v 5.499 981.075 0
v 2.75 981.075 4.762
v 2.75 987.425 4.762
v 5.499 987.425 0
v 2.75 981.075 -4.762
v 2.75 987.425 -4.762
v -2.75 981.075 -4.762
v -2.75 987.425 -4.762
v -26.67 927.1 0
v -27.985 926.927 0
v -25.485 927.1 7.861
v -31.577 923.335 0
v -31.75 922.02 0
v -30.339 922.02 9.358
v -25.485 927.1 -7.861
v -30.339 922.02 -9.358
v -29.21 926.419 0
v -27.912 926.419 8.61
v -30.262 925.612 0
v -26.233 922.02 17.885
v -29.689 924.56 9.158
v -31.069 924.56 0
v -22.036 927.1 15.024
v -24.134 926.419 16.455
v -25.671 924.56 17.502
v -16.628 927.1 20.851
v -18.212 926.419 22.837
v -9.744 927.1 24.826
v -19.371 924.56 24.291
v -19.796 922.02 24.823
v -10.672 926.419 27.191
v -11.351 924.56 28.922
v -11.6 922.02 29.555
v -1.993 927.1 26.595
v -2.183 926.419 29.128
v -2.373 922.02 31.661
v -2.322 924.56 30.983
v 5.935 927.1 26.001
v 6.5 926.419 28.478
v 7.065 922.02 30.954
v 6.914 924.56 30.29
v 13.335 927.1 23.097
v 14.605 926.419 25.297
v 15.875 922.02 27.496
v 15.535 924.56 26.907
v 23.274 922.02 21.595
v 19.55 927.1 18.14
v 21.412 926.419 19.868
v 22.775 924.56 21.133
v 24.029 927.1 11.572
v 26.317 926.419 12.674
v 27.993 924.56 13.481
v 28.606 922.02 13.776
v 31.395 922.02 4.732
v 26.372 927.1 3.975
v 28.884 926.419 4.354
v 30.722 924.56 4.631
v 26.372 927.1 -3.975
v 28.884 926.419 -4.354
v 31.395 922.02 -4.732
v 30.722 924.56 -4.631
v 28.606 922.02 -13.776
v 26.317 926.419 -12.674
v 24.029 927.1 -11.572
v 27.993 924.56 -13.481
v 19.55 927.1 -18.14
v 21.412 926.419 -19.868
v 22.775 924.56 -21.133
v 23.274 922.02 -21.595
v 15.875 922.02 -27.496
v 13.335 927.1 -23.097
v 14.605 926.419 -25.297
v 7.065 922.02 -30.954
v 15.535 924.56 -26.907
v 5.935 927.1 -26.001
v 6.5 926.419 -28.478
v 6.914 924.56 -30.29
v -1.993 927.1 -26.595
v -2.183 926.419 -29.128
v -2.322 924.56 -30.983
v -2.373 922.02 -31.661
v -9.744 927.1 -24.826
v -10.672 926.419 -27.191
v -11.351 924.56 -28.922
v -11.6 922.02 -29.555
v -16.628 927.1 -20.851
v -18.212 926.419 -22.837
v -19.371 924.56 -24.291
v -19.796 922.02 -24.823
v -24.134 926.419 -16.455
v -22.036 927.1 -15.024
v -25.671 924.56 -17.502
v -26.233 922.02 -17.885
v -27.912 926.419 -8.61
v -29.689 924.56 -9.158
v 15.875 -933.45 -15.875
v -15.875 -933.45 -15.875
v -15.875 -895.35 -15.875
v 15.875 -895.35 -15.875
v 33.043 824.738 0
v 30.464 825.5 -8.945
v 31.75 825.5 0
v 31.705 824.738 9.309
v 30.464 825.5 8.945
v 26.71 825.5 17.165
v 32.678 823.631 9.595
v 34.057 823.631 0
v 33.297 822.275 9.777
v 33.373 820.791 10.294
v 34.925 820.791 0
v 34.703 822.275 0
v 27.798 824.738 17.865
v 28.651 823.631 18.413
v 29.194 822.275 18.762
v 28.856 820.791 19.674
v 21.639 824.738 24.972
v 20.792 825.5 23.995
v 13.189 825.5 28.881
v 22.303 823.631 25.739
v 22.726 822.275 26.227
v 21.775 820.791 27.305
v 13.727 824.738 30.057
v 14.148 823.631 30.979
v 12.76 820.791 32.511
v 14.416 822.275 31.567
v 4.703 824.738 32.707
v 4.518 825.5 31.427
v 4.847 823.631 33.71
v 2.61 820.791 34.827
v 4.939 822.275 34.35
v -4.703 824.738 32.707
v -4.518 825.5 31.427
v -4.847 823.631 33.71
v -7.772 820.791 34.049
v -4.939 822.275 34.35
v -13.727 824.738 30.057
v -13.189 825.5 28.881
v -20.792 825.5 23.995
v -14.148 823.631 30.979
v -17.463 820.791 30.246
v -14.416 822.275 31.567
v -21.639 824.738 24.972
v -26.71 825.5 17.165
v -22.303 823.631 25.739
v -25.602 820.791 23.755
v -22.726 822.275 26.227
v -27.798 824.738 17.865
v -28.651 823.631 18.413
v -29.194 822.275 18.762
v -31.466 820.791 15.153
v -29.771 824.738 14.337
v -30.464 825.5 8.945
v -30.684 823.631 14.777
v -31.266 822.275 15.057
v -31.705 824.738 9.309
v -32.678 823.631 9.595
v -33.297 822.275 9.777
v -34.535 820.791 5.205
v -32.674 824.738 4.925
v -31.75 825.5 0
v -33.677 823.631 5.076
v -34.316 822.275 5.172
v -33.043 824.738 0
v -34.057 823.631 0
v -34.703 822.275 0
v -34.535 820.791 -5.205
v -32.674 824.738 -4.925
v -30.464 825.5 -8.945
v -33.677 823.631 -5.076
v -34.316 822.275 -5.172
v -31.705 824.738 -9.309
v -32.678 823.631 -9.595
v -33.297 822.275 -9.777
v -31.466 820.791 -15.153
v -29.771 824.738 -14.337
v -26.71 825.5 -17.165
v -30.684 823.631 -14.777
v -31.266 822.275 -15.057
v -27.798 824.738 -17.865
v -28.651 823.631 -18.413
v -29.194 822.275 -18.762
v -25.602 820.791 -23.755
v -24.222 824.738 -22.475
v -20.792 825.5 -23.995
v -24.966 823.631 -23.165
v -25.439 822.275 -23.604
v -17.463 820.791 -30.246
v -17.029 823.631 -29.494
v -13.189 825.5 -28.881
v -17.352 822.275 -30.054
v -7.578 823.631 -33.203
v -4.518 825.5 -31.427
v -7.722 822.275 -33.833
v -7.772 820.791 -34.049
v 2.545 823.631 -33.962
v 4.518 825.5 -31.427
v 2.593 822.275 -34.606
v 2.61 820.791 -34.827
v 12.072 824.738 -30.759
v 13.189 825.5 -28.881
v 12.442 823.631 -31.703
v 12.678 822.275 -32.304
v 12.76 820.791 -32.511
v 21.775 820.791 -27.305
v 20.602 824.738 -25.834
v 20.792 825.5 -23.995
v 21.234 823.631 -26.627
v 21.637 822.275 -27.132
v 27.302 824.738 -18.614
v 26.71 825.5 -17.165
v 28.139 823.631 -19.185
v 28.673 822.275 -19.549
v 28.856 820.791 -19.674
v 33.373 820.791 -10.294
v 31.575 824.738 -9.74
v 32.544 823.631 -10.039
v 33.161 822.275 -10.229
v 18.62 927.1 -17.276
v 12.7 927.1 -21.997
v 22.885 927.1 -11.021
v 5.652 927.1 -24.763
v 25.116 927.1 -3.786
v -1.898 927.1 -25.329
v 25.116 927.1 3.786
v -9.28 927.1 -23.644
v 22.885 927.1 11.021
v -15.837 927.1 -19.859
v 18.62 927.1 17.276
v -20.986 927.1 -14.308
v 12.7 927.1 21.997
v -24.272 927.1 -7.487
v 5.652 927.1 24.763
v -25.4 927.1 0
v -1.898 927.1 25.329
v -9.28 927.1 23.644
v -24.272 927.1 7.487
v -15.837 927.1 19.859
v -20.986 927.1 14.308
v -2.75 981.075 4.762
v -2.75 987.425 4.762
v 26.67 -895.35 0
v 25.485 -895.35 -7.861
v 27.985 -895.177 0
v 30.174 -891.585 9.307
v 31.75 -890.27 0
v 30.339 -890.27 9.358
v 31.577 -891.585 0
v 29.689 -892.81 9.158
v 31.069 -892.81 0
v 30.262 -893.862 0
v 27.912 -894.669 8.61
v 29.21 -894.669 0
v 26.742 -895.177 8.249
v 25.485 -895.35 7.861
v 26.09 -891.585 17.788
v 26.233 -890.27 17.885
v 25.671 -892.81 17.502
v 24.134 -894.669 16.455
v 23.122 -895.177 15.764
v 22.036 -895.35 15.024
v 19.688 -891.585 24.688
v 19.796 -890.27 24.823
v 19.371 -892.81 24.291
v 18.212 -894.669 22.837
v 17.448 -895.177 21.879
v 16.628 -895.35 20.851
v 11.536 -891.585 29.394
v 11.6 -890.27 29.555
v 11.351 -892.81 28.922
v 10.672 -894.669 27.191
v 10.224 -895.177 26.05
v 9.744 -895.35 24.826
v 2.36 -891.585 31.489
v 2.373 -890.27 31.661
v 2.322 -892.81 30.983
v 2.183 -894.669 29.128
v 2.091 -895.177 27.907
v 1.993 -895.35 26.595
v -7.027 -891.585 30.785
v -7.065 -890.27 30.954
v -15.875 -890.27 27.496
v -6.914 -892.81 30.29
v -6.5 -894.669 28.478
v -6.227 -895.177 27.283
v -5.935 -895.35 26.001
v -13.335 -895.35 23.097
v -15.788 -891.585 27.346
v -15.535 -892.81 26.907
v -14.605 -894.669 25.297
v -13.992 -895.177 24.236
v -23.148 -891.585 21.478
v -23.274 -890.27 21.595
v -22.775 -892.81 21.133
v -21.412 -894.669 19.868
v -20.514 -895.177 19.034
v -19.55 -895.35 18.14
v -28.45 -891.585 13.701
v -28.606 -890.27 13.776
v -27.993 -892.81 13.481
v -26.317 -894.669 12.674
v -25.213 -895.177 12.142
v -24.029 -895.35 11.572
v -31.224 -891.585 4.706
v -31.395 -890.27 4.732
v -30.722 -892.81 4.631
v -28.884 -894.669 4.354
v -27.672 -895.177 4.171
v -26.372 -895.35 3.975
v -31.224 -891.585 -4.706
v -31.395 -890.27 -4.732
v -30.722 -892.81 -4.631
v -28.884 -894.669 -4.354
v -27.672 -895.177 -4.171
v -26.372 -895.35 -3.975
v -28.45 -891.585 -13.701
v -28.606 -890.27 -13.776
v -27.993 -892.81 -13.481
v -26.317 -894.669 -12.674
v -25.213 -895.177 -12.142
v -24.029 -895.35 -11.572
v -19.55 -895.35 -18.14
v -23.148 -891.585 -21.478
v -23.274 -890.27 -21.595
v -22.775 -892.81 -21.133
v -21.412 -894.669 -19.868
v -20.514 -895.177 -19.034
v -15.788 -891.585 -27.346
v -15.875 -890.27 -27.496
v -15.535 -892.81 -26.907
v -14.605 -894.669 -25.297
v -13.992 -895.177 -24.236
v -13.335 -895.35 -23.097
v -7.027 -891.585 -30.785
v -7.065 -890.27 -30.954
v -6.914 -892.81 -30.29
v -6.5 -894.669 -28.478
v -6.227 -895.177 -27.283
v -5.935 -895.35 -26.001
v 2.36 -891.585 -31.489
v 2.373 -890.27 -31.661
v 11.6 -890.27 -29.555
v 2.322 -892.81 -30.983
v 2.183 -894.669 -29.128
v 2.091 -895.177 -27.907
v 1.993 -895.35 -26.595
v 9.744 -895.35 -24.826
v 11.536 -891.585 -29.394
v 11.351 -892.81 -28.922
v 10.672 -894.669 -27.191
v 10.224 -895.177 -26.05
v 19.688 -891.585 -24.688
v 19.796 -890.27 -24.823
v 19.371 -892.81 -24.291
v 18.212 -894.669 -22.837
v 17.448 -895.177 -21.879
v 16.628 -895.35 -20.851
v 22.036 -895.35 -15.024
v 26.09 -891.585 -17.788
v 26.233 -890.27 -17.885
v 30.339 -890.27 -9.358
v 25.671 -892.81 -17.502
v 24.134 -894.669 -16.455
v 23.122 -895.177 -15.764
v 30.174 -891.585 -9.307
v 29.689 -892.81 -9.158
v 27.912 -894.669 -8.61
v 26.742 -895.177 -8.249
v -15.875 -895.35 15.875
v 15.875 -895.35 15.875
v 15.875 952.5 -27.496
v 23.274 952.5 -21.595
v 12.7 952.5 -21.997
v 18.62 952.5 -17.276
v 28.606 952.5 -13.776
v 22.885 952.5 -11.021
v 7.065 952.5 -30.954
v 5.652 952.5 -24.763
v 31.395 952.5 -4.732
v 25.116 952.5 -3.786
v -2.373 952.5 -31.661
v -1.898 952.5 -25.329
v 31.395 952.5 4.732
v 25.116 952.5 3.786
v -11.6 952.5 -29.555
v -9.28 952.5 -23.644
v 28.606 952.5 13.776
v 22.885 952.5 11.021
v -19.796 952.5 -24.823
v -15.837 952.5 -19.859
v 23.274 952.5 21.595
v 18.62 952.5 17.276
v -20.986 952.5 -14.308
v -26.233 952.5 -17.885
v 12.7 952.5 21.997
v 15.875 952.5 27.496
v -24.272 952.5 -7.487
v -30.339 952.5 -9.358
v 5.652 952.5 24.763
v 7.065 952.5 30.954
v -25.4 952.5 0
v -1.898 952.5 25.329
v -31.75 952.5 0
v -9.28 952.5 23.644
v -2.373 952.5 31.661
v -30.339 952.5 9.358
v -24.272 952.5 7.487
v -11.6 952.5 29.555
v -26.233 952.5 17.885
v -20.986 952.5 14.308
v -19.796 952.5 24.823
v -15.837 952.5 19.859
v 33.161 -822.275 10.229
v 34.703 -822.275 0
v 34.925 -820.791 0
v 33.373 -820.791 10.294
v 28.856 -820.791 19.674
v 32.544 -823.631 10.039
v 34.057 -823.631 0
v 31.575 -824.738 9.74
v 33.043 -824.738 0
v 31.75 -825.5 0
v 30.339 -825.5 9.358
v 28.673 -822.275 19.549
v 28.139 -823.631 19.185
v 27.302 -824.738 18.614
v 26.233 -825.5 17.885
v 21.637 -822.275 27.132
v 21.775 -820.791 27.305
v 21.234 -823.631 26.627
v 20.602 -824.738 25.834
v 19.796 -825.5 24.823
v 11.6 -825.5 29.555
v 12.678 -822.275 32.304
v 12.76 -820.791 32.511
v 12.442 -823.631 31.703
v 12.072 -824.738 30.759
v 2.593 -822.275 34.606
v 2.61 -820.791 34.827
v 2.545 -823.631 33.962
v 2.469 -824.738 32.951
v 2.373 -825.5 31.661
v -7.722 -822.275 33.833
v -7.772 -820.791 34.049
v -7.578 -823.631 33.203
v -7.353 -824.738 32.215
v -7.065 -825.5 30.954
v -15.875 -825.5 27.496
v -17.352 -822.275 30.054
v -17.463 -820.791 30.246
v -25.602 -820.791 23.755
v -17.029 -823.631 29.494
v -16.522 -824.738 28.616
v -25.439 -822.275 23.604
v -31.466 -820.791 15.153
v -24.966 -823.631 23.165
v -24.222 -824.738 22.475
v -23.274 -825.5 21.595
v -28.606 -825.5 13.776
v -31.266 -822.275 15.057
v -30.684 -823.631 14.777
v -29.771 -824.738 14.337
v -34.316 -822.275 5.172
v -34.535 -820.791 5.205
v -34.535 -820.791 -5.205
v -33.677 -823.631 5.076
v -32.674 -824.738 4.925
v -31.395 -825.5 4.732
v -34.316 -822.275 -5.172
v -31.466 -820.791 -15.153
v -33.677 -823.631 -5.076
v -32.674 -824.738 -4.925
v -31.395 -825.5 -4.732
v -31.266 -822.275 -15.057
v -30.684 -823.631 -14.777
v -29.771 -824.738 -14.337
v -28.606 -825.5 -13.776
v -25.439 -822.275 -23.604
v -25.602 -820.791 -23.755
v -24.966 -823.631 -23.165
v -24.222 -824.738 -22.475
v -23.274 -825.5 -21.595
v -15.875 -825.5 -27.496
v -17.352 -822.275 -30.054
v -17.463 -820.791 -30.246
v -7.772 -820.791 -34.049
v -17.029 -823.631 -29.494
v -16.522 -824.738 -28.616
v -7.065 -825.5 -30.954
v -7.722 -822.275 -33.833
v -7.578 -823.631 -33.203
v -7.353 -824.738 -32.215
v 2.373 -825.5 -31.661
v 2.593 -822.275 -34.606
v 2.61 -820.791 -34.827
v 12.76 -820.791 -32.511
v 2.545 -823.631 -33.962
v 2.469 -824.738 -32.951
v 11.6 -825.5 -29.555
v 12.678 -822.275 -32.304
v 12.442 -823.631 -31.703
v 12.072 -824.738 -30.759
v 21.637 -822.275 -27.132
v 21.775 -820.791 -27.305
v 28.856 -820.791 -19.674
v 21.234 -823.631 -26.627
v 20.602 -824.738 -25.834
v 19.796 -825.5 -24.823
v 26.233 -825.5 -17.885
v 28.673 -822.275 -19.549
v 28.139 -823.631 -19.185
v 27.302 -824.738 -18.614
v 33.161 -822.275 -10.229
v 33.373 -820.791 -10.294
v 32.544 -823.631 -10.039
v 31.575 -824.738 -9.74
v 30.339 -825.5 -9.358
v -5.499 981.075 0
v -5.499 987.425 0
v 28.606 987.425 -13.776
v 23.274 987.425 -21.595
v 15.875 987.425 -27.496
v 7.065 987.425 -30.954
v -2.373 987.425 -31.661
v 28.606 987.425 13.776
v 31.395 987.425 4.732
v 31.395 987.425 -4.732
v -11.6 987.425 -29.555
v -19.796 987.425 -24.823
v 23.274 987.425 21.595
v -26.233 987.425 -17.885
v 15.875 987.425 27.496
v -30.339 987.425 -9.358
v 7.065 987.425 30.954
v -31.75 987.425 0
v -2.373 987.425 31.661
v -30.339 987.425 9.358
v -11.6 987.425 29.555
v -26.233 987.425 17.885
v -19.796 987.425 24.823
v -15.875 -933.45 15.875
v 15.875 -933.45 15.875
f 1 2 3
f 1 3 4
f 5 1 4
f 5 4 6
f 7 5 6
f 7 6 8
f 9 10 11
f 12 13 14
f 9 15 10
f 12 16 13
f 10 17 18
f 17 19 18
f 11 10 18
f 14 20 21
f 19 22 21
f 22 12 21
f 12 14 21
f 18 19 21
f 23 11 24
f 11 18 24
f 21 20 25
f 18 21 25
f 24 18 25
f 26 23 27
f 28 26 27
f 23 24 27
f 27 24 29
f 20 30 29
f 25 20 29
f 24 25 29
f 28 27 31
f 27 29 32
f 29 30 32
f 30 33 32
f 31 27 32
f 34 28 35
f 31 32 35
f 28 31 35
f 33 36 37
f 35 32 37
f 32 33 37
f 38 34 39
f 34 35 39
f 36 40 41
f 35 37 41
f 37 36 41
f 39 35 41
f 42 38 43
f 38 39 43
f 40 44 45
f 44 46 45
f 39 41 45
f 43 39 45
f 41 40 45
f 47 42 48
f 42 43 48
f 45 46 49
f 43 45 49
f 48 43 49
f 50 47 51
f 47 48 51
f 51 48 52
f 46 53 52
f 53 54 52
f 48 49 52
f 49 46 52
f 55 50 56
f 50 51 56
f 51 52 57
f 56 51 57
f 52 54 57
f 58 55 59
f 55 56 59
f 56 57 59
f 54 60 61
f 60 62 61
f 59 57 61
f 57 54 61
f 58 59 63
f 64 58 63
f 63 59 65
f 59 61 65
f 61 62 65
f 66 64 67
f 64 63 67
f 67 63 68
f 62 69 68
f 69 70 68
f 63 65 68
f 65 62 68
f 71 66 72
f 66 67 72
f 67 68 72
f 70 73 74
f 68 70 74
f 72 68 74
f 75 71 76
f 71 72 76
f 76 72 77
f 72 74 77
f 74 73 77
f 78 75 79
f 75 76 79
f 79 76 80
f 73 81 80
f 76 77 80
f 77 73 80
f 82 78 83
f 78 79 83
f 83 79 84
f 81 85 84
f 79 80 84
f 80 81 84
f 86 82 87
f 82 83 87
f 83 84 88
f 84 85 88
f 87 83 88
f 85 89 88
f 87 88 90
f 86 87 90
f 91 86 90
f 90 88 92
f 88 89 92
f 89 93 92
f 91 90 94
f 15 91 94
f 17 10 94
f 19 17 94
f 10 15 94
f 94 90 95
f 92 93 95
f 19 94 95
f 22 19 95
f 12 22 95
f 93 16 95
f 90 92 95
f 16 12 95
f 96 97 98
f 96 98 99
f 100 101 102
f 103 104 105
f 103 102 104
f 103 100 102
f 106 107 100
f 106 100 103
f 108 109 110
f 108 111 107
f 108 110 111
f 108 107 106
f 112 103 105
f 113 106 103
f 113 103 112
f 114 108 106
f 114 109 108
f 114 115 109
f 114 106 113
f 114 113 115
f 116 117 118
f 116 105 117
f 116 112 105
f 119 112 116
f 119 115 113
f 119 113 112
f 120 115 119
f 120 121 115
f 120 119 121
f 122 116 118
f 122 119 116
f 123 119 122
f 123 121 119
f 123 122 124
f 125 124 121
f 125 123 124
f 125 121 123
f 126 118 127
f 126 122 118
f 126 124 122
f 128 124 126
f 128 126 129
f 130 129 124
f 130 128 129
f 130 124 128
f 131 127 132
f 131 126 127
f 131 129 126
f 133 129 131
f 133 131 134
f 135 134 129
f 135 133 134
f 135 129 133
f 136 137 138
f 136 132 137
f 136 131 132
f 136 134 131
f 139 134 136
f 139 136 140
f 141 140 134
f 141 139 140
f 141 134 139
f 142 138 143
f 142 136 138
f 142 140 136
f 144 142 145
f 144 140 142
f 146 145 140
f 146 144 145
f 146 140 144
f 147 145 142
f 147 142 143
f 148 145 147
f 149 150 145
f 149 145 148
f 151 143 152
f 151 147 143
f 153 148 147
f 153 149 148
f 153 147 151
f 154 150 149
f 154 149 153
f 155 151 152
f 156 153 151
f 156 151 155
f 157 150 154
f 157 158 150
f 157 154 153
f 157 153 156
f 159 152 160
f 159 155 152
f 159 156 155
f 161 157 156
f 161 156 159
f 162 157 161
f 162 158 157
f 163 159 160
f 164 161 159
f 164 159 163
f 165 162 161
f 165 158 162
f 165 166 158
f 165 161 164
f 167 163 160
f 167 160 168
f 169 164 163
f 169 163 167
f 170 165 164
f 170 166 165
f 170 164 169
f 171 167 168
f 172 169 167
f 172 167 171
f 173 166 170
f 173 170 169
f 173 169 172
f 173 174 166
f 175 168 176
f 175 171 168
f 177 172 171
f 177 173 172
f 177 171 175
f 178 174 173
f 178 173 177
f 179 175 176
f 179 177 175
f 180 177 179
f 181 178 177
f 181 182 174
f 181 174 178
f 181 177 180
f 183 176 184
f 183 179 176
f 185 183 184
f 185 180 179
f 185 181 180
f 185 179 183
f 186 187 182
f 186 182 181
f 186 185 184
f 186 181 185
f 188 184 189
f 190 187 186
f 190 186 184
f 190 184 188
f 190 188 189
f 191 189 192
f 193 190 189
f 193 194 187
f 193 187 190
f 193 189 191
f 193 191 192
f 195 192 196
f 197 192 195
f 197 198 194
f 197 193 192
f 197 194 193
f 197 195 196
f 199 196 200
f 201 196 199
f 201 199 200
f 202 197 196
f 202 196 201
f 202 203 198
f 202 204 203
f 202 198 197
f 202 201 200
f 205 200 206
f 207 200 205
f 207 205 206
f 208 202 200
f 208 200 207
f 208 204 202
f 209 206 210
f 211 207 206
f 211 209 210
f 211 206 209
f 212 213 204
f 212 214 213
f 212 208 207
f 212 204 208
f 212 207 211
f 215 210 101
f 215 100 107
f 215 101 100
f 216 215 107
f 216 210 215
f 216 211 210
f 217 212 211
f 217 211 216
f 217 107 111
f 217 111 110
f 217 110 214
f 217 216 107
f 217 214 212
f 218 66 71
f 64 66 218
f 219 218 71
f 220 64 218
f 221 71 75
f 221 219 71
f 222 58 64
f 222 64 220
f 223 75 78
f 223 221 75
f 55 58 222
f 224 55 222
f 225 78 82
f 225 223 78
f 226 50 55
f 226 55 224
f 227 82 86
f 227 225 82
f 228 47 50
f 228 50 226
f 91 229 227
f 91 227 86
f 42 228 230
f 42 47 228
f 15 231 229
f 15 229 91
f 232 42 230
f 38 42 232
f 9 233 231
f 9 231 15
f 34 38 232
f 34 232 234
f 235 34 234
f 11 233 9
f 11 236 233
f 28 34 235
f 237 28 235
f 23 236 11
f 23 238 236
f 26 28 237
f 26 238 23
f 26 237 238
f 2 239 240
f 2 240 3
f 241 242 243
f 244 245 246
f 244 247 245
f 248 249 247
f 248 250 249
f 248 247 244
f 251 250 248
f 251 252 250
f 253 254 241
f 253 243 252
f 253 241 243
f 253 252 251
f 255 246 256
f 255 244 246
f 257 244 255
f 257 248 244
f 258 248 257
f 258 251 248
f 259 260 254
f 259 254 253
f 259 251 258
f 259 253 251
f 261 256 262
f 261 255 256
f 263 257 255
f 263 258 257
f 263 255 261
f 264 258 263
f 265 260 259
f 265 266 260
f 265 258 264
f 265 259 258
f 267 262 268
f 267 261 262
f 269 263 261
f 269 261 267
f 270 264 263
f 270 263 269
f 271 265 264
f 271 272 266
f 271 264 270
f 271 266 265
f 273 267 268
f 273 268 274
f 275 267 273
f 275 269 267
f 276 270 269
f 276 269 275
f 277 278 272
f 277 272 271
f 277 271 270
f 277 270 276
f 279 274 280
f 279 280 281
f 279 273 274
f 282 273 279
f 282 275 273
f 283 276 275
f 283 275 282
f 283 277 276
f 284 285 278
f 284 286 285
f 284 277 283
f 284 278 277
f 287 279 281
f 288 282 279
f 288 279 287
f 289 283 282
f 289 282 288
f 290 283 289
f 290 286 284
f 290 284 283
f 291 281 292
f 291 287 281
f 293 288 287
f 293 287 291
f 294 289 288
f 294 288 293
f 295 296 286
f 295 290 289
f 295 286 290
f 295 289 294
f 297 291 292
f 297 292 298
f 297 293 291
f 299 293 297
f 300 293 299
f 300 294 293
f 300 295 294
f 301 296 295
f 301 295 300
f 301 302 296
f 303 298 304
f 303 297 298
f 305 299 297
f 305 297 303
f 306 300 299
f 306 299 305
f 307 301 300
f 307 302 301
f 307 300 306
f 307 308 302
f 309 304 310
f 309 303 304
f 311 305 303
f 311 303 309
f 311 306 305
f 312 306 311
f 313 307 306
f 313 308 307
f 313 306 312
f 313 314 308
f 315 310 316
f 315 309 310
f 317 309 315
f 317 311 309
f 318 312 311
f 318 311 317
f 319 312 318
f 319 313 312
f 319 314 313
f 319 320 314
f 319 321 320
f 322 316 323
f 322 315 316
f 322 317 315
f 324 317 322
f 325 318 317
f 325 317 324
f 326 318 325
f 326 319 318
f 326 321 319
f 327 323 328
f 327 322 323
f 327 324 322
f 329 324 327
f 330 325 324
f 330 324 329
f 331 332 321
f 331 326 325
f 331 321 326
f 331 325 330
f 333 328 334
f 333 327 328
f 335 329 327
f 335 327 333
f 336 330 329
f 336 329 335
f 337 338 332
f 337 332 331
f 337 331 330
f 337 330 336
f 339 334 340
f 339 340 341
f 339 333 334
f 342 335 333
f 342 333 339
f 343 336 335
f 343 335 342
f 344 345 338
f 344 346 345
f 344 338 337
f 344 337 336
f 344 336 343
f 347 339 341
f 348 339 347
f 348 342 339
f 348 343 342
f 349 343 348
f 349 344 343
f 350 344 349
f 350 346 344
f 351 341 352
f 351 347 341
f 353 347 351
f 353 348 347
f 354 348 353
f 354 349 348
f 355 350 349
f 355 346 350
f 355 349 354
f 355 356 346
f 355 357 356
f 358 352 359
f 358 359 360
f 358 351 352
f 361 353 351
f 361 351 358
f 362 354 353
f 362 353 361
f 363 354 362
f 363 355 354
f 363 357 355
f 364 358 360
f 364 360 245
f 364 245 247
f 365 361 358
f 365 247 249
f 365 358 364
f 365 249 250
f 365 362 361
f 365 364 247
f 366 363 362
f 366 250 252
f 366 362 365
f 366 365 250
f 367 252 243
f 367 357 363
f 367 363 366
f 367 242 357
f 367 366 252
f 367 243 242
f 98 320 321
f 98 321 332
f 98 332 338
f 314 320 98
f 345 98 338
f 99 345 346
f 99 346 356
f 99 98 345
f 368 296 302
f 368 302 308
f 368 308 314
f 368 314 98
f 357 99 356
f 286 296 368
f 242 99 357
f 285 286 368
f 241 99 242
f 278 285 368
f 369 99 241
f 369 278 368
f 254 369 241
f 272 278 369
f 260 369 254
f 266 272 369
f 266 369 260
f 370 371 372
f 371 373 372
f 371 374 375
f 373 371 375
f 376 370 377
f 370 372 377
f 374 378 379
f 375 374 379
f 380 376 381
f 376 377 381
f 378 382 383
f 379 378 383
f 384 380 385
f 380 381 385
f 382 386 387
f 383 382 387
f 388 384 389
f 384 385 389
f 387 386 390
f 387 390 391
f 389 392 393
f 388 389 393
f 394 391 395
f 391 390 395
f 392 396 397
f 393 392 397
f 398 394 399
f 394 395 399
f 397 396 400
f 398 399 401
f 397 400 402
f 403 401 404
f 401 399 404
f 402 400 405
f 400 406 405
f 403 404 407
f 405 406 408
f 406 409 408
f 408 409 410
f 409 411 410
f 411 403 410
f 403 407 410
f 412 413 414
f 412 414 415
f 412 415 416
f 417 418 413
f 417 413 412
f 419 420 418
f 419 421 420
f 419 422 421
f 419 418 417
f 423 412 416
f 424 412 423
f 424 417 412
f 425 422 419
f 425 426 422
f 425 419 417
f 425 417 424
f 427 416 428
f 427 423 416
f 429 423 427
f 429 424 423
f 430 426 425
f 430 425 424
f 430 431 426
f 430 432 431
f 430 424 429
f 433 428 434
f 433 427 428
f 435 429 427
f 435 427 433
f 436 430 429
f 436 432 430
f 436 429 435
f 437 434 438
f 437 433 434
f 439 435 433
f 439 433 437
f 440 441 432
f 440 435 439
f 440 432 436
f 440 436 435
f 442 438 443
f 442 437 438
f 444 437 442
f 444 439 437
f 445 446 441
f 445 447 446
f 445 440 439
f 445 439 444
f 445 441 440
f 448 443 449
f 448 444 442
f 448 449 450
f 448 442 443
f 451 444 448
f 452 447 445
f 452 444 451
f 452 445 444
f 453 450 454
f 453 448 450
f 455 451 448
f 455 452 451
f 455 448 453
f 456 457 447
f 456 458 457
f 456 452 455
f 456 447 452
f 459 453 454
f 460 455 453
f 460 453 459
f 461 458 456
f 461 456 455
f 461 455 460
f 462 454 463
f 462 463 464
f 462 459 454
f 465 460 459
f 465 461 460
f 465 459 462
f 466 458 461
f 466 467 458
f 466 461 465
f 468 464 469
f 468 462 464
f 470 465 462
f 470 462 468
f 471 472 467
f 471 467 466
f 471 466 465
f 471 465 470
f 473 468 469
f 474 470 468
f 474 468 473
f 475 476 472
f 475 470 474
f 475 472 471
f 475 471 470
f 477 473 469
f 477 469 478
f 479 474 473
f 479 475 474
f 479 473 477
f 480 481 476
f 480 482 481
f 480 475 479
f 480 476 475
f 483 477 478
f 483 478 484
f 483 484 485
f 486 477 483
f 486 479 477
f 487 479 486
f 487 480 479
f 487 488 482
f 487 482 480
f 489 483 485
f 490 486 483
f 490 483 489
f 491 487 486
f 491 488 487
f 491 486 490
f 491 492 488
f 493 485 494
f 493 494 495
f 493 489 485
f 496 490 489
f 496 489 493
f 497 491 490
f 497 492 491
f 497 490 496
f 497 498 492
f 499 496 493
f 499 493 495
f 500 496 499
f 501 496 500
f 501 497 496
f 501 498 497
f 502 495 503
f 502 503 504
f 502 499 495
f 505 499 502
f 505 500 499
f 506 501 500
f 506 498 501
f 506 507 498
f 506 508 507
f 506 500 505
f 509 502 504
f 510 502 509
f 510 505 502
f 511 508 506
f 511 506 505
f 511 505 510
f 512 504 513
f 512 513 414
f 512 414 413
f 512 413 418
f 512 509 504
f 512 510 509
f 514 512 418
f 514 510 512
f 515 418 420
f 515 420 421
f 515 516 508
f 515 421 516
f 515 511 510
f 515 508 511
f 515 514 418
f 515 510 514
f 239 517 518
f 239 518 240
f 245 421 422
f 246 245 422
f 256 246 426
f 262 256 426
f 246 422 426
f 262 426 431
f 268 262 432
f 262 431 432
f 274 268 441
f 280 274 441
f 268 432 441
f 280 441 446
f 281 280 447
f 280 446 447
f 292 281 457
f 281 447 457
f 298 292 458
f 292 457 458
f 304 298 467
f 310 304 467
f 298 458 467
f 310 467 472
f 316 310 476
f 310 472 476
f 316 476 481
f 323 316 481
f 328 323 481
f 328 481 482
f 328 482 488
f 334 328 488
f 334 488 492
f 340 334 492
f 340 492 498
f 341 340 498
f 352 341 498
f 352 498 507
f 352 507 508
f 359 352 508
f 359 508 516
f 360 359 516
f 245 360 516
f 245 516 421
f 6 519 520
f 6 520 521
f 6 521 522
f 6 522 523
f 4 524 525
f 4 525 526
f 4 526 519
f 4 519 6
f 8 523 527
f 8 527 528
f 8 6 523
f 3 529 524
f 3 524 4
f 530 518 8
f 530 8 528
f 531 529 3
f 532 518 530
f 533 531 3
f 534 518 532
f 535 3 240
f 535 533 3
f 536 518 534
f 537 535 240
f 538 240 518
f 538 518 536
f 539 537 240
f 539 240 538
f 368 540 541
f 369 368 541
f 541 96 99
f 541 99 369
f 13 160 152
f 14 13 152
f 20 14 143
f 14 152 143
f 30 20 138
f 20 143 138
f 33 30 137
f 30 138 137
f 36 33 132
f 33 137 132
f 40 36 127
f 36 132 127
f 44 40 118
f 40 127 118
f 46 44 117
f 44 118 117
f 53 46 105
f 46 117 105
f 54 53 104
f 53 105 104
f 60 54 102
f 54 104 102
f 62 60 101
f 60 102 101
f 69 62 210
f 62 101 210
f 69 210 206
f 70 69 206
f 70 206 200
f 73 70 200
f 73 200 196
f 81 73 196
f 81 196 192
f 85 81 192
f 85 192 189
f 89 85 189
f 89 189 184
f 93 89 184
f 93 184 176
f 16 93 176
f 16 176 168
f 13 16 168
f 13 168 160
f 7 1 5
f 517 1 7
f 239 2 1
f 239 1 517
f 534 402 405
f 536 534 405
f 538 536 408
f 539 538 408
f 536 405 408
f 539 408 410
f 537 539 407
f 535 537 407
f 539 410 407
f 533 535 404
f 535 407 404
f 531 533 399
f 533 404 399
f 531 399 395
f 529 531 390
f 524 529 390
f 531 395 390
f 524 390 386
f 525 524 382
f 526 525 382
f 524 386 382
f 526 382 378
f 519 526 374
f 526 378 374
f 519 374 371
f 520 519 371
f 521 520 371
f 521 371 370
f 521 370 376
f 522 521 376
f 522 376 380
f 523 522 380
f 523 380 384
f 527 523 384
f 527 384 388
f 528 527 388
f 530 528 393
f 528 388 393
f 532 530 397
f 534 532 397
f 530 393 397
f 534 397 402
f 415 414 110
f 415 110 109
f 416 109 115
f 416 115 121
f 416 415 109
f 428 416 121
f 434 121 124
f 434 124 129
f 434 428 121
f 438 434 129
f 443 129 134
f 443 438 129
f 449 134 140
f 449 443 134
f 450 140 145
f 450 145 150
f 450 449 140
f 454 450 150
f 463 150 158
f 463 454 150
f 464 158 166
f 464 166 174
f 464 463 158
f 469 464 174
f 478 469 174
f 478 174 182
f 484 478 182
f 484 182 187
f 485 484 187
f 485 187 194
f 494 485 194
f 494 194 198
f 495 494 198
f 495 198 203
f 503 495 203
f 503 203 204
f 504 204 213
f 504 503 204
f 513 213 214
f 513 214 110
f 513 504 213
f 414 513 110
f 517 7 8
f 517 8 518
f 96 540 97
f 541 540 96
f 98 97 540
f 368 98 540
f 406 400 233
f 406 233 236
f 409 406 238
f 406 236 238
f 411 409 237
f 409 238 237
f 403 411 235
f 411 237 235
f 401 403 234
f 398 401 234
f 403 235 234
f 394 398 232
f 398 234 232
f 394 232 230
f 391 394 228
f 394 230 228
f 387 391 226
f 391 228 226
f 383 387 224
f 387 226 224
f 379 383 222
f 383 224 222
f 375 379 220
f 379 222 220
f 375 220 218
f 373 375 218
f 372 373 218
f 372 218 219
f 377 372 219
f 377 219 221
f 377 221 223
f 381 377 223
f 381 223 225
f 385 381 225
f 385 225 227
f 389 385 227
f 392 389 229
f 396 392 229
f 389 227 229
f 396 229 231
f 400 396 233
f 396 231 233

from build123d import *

# Parameters (mm, degrees)
F0_R      = 34.925
F1_DEPTH  = 825.5
F2_R      = 31.75
F3_DEPTH  = 69.85
F4_R      = 31.75
F5_DEPTH  = 101.6
F6_W      = 31.75
F6_H      = 31.75
F7_DEPTH  = 38.1
F8_R      = 25.4
F9_DEPTH  = 25.4
F10_R     = 31.75
F10_R_2   = 25.4
F11_DEPTH = 34.925
F14_DEPTH = 6.35


# Not quite as in the source:
# - a fillet or chamfer that OpenCascade refuses, or shapes differently, is made with other operations: its cross-section is extruded or revolved along the edge and cut away or added


with BuildPart() as f1:
    # F0 (on Front) → F1 (new body, symmetric)
    with BuildSketch(Plane.XZ):
        Circle(F0_R)
    extrude(amount=F1_DEPTH, both=True)

    # F2 (on face) → F3 (join)
    with BuildSketch(Plane.XZ.offset(825.5)):
        Circle(F2_R)
    extrude(amount=F3_DEPTH)

    # F4 (on face) → F5 (join)
    with BuildSketch(Plane(origin=(0, 825.5, 0), x_dir=(-1, 0, 0), z_dir=(0, 1, 0))):
        Circle(F4_R)
    extrude(amount=F5_DEPTH)

    # F6 (on face) → F7 (join)
    with BuildSketch(Plane.XZ.offset(895.35)):
        Rectangle(F6_W, F6_H)
    extrude(amount=F7_DEPTH)

    # F8 (on face) → F9 (join)
    with BuildSketch(Plane(origin=(0, 927.1, 0), x_dir=(-1, 0, 0), z_dir=(0, 1, 0))):
        Circle(F8_R)
    extrude(amount=F9_DEPTH)

    # F10 (on face) → F11 (join)
    with BuildSketch(Plane(origin=(0, 952.5, 0), x_dir=(-1, 0, 0), z_dir=(0, 1, 0))):
        Circle(F10_R)
        Circle(F10_R_2, mode=Mode.SUBTRACT)
        Circle(F10_R_2)
    extrude(amount=F11_DEPTH)

    # F12: fillet of radius 5.08 on 4 edges, made by hand

    # F12_s1 → F12_t2 (revolve, cut)
    with BuildSketch(Plane.XY):
        with BuildLine():
            ThreePointArc((31.75, 825.5), (34.0571134838, 823.6305202921), (34.925, 820.7907139607))
            Line((34.925, 820.7907139607), (34.925, 825.5))
            Line((34.925, 825.5), (31.75, 825.5))
        make_face()
    revolve(axis=Axis((0, 825.5, 0), (0, -1, 0)), mode=Mode.SUBTRACT)

    # F12_s3 → F12_t4 (revolve, cut)
    with BuildSketch(Plane.XY):
        with BuildLine():
            ThreePointArc((34.925, -820.7907139607), (34.0571134838, -823.6305202921), (31.75, -825.5))
            Line((31.75, -825.5), (34.925, -825.5))
            Line((34.925, -825.5), (34.925, -820.7907139607))
        make_face()
    revolve(axis=Axis((0, -825.5, 0), (0, -1, 0)), mode=Mode.SUBTRACT)

    # F12_s5 → F12_t6 (revolve, cut)
    with BuildSketch(Plane.XY):
        with BuildLine():
            ThreePointArc((31.75, -890.27), (30.2621024484, -893.8621024484), (26.67, -895.35))
            Line((26.67, -895.35), (31.75, -895.35))
            Line((31.75, -895.35), (31.75, -890.27))
        make_face()
    revolve(axis=Axis((0, -895.35, 0), (0, -1, 0)), mode=Mode.SUBTRACT)

    # F12_s7 → F12_t8 (revolve, cut)
    with BuildSketch(Plane.XY):
        with BuildLine():
            ThreePointArc((-26.67, 927.1), (-30.2621024484, 925.6121024484), (-31.75, 922.02))
            Line((-31.75, 922.02), (-31.75, 927.1))
            Line((-31.75, 927.1), (-26.67, 927.1))
        make_face()
    revolve(axis=Axis((0, 927.1, 0), (0, 1, 0)), mode=Mode.SUBTRACT)

    # F13 (on face) → F14 (cut)
    with BuildSketch(Plane(origin=(0, 987.425, 0), x_dir=(-1, 0, 0), z_dir=(0, 1, 0))):
        Polygon((2.749630657, 4.7625), (-2.749630657, 4.7625), (-5.499261314, 0), (-2.749630657, -4.7625), (2.749630657, -4.7625), (5.499261314, 0), align=None)
    extrude(amount=-F14_DEPTH, mode=Mode.SUBTRACT)


solid = f1.part
